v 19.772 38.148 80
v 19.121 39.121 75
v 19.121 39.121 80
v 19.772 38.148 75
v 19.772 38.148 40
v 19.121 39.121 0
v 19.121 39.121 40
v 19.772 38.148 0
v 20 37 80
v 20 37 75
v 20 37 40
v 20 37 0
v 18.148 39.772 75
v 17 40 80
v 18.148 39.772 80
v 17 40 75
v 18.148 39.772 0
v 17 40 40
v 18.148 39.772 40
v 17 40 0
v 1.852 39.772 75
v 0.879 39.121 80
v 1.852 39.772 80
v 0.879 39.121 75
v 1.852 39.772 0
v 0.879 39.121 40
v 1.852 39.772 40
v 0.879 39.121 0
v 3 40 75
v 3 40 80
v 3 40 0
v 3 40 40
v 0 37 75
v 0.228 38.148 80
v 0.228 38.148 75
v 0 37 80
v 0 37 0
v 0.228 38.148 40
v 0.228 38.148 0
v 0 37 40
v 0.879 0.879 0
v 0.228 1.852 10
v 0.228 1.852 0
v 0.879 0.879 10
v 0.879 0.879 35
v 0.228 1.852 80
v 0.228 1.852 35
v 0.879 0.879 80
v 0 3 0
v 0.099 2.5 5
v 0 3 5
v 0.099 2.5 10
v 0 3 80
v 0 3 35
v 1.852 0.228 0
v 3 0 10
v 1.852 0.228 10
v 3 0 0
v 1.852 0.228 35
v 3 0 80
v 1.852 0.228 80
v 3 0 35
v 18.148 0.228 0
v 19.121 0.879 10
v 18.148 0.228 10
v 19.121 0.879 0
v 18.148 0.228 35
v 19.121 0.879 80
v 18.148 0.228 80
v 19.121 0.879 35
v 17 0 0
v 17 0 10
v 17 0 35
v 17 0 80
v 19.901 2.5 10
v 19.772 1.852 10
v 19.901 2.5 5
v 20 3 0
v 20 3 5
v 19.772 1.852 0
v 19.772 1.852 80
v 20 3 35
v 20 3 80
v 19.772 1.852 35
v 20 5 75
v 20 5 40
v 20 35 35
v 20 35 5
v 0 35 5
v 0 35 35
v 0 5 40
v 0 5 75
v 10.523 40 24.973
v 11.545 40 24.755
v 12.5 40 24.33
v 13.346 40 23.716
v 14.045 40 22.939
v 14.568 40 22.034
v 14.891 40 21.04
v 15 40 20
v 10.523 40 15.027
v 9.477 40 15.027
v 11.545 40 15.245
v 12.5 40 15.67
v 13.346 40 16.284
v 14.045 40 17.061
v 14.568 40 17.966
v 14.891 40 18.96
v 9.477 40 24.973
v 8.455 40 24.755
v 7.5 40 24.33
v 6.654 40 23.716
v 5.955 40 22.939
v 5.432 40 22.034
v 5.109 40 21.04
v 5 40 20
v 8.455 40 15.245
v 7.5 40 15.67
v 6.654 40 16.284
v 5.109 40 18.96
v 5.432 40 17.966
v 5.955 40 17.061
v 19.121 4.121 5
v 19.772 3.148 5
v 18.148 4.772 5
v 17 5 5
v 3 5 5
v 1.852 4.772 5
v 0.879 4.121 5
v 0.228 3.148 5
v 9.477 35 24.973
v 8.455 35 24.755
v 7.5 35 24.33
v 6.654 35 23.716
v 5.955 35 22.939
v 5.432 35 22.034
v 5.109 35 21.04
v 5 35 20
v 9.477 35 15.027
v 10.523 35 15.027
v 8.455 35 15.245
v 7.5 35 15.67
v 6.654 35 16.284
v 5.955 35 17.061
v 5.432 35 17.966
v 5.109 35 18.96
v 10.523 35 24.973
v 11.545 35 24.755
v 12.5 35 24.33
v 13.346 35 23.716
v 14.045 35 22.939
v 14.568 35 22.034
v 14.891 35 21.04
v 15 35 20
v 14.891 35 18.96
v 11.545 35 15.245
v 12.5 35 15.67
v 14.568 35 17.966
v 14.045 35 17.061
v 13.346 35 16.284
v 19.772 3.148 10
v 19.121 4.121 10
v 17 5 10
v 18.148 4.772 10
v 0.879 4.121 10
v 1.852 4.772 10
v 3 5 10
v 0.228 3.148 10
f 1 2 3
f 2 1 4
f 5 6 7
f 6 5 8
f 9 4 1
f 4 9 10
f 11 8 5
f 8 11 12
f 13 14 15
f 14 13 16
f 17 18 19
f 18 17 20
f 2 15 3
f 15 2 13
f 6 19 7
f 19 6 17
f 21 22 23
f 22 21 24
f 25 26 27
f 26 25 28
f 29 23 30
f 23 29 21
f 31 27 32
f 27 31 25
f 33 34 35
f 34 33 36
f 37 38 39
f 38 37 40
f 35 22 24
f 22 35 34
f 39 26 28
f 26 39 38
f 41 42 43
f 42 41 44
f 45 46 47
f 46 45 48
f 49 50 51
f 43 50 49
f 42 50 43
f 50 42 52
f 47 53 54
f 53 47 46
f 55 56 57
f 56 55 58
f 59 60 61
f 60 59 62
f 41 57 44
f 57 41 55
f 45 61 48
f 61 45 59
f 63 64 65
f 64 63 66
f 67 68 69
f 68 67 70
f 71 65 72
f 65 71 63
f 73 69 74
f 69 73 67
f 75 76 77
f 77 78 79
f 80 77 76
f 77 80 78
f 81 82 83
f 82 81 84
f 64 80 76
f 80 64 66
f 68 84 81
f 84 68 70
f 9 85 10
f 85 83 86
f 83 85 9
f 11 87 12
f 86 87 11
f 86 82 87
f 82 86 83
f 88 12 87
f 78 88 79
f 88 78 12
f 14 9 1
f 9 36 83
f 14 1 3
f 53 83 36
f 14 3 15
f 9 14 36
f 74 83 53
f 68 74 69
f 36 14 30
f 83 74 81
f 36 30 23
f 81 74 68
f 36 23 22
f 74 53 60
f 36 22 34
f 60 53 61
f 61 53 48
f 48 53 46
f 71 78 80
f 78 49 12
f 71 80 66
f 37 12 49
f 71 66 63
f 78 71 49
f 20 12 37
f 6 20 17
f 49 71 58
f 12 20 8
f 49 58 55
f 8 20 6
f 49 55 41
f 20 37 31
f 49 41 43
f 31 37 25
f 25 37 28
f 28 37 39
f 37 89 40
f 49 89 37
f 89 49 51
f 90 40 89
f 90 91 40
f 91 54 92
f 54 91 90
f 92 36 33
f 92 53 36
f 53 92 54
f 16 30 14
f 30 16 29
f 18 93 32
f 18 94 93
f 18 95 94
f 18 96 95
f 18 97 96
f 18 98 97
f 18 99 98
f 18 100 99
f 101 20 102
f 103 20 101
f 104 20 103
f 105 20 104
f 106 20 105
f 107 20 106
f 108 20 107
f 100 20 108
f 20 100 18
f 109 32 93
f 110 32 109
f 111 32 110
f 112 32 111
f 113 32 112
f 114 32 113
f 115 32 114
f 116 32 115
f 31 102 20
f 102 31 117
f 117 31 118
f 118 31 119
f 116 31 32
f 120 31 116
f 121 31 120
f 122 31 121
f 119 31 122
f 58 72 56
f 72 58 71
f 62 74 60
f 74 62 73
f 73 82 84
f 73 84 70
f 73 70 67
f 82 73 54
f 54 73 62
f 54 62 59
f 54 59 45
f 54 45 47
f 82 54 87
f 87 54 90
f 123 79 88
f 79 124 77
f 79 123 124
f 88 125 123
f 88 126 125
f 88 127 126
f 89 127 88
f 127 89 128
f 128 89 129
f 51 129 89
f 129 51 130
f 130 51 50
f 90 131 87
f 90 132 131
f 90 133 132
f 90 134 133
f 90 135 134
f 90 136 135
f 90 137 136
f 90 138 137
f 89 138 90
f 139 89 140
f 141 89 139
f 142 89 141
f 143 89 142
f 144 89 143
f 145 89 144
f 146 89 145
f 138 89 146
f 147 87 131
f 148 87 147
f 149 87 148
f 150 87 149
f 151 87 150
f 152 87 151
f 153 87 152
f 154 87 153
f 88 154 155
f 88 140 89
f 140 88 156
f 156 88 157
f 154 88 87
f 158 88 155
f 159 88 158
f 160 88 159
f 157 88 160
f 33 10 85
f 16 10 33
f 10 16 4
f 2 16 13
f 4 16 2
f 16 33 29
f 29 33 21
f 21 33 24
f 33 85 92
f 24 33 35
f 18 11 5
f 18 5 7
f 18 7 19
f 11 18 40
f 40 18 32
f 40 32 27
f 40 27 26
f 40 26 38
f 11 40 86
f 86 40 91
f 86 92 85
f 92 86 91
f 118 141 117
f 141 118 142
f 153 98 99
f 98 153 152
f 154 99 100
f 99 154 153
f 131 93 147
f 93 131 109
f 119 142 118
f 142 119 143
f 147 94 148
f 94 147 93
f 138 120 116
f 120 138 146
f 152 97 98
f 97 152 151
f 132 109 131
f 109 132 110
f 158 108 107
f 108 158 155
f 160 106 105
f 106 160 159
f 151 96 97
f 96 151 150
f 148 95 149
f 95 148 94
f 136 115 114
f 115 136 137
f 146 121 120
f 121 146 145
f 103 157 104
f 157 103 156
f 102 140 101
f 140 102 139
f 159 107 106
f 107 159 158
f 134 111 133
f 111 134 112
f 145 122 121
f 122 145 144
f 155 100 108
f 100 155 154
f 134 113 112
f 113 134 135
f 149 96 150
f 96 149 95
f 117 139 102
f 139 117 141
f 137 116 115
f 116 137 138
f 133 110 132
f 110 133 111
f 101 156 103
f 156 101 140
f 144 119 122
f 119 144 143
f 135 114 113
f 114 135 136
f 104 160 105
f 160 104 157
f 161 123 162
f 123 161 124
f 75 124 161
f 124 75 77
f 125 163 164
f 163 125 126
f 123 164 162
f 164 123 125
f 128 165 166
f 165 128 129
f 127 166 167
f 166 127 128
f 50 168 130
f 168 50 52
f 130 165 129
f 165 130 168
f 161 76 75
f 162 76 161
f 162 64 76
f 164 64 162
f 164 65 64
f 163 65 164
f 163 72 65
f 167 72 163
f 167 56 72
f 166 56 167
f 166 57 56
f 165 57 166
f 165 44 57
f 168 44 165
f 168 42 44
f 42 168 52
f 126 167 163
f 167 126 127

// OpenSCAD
// Parametric Desk Hook w/ Hole for Headphone Cable
// fros1y 

// Width of hook
width = 20;

// Thickness of desk
desk_height = 35;

// Height of headphones portion
hook_height = 30;

//Height of the hook of the headphones portion
hook_end_height = 5;

// Thickness of Plastic in Hook
thickness = 5;

// Depth of Hook
depth=40;

// Diameter of Headphone Jack (0 disables)
jack = 10;

// Fillet code borrowed from Vaclav Hula (http://axuv.blogspot.com/2012/05/openscad-helper-funcions-for-better.html)

module fillet(radius, height=100, $fn=16) {                                     
    //this creates negative of fillet,
    //i.e. thing to be substracted from object
    translate([-radius, -radius, -height/2-0.01])
        difference() {
            cube([radius*2, radius*2, height+0.02]);
            cylinder(r=radius, h=height+0.02, $fn=16);
        }
}


module cube_negative_fillet(
        size,
        radius=-1,
        vertical=[3,3,3,3], 
        top=[0,0,0,0],
        bottom=[0,0,0,0],
        $fn=0
    ){

    j=[1,0,1,0];

    for (i=[0:3]) {
        if (radius > -1) {
            rotate([0, 0, 90*i])
                translate([size[1-j[i]]/2, size[j[i]]/2, 0])
                    fillet(radius, size[2], $fn=$fn);
        } else {
            rotate([0, 0, 90*i])
                translate([size[1-j[i]]/2, size[j[i]]/2, 0])
                    fillet(vertical[i], size[2], $fn=$fn);
        }
        rotate([90*i, -90, 0])
            translate([size[2]/2, size[j[i]]/2, 0 ])
                fillet(top[i], size[1-j[i]], $fn=$fn);
        rotate([90*(4-i), 90, 0])
            translate([size[2]/2, size[j[i]]/2, 0])
                fillet(bottom[i], size[1-j[i]], $fn=$fn);
    }
}

module cube_fillet_inside(
         size,
        radius=-1,
        vertical=[3,3,3,3],
        top=[0,0,0,0],
        bottom=[0,0,0,0],
        $fn=0
    ){
    if (radius == 0) {
        cube(size, center=true);
    } else {
        difference() {
            cube(size, center=true);
            cube_negative_fillet(size, radius, vertical, top, bottom, $fn);
        }
    }
}


module cube_fillet(
        size,
        radius=-1,
        vertical=[3,3,3,3],
        top=[0,0,0,0],
        bottom=[0,0,0,0],
        center=false,
        $fn=0 
    ){
    if (center) {
        cube_fillet_inside(size, radius, vertical, top, bottom, $fn);
    } else {
        translate([size[0]/2, size[1]/2, size[2]/2])
            cube_fillet_inside(size, radius, vertical, top, bottom, $fn);
    }
}

module desk_hook(width, desk_height, hook_height, thickness, depth, jack)
{
	difference() {
		cube_fillet([width, depth, thickness + desk_height + thickness + hook_height + thickness]);
		//cube([width, depth, thickness + desk_height + thickness + hook_height + thickness]);

		translate([0, 0, thickness]) {
			cube([width, depth - thickness, hook_height]);
		}

		translate([0, thickness, thickness + hook_height + thickness]) {
			cube([width,depth - thickness, desk_height]);
		}
	
		if(jack > 0)
		{
			translate([width/2, 0, thickness + hook_height /2])
				rotate(90, [1, 0, 0])
				cylinder(r=jack/2, center=true, h=depth*3, $fs=0.05);
		}	
	}

	cube_fillet([width, thickness, hook_end_height + thickness]);
}

desk_hook(width, desk_height, hook_height, thickness, depth, jack);
